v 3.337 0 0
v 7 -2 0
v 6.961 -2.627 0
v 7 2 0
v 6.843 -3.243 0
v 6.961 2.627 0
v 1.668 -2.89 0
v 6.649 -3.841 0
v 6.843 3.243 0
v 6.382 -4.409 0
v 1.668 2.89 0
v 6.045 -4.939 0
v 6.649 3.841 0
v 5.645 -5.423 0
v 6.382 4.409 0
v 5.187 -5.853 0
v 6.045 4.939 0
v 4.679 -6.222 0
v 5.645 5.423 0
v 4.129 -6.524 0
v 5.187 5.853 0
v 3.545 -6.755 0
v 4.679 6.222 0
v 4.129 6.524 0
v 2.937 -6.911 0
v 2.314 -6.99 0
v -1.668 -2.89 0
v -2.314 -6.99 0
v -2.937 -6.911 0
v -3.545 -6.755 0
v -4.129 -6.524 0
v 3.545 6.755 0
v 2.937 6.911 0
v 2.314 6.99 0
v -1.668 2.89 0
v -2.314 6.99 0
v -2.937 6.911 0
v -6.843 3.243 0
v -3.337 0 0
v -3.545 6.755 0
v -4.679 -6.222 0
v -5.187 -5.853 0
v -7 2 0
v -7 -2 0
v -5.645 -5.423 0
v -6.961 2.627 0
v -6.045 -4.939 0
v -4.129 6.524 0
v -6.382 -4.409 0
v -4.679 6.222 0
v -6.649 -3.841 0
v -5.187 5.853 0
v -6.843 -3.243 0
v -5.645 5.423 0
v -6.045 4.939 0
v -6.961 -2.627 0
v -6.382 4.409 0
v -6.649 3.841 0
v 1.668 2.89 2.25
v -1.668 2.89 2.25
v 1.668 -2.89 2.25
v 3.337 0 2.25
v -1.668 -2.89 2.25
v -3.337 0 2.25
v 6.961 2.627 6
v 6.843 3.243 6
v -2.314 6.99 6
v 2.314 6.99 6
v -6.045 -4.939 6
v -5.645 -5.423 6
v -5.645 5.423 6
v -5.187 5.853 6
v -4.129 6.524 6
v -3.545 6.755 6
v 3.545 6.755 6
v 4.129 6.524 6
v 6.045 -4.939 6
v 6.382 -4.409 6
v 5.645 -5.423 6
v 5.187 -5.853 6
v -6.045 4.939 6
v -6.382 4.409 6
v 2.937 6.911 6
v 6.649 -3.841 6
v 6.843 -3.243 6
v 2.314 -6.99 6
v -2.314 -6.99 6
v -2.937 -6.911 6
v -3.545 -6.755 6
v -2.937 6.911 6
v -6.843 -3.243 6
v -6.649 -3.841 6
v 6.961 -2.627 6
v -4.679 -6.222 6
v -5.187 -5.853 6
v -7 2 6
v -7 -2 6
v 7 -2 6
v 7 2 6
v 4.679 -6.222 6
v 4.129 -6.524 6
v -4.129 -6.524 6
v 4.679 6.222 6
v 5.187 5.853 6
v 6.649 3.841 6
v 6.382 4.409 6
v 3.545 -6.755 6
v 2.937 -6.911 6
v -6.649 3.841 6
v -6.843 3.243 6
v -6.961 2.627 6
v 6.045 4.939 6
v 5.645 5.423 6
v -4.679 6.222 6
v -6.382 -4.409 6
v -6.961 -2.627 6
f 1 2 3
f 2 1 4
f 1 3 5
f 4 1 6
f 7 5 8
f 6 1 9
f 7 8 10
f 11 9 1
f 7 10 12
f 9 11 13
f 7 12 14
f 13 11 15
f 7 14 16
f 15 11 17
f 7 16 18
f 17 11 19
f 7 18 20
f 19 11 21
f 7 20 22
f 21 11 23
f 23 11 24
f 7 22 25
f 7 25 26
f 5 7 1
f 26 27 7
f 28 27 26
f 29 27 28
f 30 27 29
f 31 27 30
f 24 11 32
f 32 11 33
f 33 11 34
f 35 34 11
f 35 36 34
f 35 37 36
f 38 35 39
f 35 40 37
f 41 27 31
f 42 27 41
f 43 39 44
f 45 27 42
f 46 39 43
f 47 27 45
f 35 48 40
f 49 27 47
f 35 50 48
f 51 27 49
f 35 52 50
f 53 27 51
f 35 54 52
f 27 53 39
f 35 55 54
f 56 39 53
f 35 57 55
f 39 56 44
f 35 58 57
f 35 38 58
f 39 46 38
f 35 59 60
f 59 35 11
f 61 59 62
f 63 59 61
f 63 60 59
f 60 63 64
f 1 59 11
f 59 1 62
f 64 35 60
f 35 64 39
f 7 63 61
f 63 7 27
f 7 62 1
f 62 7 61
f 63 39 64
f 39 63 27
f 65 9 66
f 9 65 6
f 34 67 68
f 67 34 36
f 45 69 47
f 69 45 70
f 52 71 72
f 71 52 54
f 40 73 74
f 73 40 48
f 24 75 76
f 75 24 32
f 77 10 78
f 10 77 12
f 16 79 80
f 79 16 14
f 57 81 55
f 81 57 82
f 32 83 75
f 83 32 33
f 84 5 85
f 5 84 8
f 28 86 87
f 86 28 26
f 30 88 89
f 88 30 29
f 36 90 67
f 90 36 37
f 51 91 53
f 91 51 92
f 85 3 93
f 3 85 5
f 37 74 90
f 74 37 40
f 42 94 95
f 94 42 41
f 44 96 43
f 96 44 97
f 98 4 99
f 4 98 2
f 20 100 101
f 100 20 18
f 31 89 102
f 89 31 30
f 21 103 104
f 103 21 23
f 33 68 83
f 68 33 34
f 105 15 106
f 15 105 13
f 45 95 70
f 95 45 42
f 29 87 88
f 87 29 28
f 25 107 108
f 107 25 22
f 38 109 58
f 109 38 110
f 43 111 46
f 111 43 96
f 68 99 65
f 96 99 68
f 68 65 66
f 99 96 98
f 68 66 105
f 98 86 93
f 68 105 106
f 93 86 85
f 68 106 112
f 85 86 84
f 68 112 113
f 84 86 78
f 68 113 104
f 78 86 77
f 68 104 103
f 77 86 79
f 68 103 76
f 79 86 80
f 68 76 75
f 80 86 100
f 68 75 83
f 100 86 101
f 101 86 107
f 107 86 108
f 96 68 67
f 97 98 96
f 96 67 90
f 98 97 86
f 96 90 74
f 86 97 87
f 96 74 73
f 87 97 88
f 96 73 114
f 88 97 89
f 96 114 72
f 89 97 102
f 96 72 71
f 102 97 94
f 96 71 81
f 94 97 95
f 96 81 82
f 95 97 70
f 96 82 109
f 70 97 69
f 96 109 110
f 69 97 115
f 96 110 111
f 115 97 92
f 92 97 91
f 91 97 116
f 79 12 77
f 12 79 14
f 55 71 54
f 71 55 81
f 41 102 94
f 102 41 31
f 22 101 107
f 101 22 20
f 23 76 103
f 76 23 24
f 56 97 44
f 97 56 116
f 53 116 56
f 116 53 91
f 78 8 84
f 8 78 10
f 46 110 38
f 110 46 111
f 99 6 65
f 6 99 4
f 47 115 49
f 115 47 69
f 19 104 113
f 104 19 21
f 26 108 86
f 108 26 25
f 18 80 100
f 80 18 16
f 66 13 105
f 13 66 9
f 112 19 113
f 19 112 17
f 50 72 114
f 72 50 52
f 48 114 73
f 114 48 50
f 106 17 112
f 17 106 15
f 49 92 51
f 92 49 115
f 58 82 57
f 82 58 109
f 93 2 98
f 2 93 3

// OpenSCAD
$fn = 50;


difference() {
	union() {
		hull() {
			translate(v = [2.0000000000, -2.0000000000, 0]) {
				cylinder(h = 6, r = 5);
			}
			translate(v = [-2.0000000000, -2.0000000000, 0]) {
				cylinder(h = 6, r = 5);
			}
			translate(v = [2.0000000000, 2.0000000000, 0]) {
				cylinder(h = 6, r = 5);
			}
			translate(v = [-2.0000000000, 2.0000000000, 0]) {
				cylinder(h = 6, r = 5);
			}
		}
	}
	union() {
		translate(v = [0, 0, 0]) {
			rotate(a = [0, 0, 0]) {
				difference() {
					union() {
						linear_extrude(height = 2.2500000000) {
							polygon(points = [[3.3370000000, 0.0000000000], [1.6685000000, 2.8899267724], [-1.6685000000, 2.8899267724], [-3.3370000000, 0.0000000000], [-1.6685000000, -2.8899267724], [1.6685000000, -2.8899267724]]);
						}
					}
					union();
				}
			}
		}
	}
}
